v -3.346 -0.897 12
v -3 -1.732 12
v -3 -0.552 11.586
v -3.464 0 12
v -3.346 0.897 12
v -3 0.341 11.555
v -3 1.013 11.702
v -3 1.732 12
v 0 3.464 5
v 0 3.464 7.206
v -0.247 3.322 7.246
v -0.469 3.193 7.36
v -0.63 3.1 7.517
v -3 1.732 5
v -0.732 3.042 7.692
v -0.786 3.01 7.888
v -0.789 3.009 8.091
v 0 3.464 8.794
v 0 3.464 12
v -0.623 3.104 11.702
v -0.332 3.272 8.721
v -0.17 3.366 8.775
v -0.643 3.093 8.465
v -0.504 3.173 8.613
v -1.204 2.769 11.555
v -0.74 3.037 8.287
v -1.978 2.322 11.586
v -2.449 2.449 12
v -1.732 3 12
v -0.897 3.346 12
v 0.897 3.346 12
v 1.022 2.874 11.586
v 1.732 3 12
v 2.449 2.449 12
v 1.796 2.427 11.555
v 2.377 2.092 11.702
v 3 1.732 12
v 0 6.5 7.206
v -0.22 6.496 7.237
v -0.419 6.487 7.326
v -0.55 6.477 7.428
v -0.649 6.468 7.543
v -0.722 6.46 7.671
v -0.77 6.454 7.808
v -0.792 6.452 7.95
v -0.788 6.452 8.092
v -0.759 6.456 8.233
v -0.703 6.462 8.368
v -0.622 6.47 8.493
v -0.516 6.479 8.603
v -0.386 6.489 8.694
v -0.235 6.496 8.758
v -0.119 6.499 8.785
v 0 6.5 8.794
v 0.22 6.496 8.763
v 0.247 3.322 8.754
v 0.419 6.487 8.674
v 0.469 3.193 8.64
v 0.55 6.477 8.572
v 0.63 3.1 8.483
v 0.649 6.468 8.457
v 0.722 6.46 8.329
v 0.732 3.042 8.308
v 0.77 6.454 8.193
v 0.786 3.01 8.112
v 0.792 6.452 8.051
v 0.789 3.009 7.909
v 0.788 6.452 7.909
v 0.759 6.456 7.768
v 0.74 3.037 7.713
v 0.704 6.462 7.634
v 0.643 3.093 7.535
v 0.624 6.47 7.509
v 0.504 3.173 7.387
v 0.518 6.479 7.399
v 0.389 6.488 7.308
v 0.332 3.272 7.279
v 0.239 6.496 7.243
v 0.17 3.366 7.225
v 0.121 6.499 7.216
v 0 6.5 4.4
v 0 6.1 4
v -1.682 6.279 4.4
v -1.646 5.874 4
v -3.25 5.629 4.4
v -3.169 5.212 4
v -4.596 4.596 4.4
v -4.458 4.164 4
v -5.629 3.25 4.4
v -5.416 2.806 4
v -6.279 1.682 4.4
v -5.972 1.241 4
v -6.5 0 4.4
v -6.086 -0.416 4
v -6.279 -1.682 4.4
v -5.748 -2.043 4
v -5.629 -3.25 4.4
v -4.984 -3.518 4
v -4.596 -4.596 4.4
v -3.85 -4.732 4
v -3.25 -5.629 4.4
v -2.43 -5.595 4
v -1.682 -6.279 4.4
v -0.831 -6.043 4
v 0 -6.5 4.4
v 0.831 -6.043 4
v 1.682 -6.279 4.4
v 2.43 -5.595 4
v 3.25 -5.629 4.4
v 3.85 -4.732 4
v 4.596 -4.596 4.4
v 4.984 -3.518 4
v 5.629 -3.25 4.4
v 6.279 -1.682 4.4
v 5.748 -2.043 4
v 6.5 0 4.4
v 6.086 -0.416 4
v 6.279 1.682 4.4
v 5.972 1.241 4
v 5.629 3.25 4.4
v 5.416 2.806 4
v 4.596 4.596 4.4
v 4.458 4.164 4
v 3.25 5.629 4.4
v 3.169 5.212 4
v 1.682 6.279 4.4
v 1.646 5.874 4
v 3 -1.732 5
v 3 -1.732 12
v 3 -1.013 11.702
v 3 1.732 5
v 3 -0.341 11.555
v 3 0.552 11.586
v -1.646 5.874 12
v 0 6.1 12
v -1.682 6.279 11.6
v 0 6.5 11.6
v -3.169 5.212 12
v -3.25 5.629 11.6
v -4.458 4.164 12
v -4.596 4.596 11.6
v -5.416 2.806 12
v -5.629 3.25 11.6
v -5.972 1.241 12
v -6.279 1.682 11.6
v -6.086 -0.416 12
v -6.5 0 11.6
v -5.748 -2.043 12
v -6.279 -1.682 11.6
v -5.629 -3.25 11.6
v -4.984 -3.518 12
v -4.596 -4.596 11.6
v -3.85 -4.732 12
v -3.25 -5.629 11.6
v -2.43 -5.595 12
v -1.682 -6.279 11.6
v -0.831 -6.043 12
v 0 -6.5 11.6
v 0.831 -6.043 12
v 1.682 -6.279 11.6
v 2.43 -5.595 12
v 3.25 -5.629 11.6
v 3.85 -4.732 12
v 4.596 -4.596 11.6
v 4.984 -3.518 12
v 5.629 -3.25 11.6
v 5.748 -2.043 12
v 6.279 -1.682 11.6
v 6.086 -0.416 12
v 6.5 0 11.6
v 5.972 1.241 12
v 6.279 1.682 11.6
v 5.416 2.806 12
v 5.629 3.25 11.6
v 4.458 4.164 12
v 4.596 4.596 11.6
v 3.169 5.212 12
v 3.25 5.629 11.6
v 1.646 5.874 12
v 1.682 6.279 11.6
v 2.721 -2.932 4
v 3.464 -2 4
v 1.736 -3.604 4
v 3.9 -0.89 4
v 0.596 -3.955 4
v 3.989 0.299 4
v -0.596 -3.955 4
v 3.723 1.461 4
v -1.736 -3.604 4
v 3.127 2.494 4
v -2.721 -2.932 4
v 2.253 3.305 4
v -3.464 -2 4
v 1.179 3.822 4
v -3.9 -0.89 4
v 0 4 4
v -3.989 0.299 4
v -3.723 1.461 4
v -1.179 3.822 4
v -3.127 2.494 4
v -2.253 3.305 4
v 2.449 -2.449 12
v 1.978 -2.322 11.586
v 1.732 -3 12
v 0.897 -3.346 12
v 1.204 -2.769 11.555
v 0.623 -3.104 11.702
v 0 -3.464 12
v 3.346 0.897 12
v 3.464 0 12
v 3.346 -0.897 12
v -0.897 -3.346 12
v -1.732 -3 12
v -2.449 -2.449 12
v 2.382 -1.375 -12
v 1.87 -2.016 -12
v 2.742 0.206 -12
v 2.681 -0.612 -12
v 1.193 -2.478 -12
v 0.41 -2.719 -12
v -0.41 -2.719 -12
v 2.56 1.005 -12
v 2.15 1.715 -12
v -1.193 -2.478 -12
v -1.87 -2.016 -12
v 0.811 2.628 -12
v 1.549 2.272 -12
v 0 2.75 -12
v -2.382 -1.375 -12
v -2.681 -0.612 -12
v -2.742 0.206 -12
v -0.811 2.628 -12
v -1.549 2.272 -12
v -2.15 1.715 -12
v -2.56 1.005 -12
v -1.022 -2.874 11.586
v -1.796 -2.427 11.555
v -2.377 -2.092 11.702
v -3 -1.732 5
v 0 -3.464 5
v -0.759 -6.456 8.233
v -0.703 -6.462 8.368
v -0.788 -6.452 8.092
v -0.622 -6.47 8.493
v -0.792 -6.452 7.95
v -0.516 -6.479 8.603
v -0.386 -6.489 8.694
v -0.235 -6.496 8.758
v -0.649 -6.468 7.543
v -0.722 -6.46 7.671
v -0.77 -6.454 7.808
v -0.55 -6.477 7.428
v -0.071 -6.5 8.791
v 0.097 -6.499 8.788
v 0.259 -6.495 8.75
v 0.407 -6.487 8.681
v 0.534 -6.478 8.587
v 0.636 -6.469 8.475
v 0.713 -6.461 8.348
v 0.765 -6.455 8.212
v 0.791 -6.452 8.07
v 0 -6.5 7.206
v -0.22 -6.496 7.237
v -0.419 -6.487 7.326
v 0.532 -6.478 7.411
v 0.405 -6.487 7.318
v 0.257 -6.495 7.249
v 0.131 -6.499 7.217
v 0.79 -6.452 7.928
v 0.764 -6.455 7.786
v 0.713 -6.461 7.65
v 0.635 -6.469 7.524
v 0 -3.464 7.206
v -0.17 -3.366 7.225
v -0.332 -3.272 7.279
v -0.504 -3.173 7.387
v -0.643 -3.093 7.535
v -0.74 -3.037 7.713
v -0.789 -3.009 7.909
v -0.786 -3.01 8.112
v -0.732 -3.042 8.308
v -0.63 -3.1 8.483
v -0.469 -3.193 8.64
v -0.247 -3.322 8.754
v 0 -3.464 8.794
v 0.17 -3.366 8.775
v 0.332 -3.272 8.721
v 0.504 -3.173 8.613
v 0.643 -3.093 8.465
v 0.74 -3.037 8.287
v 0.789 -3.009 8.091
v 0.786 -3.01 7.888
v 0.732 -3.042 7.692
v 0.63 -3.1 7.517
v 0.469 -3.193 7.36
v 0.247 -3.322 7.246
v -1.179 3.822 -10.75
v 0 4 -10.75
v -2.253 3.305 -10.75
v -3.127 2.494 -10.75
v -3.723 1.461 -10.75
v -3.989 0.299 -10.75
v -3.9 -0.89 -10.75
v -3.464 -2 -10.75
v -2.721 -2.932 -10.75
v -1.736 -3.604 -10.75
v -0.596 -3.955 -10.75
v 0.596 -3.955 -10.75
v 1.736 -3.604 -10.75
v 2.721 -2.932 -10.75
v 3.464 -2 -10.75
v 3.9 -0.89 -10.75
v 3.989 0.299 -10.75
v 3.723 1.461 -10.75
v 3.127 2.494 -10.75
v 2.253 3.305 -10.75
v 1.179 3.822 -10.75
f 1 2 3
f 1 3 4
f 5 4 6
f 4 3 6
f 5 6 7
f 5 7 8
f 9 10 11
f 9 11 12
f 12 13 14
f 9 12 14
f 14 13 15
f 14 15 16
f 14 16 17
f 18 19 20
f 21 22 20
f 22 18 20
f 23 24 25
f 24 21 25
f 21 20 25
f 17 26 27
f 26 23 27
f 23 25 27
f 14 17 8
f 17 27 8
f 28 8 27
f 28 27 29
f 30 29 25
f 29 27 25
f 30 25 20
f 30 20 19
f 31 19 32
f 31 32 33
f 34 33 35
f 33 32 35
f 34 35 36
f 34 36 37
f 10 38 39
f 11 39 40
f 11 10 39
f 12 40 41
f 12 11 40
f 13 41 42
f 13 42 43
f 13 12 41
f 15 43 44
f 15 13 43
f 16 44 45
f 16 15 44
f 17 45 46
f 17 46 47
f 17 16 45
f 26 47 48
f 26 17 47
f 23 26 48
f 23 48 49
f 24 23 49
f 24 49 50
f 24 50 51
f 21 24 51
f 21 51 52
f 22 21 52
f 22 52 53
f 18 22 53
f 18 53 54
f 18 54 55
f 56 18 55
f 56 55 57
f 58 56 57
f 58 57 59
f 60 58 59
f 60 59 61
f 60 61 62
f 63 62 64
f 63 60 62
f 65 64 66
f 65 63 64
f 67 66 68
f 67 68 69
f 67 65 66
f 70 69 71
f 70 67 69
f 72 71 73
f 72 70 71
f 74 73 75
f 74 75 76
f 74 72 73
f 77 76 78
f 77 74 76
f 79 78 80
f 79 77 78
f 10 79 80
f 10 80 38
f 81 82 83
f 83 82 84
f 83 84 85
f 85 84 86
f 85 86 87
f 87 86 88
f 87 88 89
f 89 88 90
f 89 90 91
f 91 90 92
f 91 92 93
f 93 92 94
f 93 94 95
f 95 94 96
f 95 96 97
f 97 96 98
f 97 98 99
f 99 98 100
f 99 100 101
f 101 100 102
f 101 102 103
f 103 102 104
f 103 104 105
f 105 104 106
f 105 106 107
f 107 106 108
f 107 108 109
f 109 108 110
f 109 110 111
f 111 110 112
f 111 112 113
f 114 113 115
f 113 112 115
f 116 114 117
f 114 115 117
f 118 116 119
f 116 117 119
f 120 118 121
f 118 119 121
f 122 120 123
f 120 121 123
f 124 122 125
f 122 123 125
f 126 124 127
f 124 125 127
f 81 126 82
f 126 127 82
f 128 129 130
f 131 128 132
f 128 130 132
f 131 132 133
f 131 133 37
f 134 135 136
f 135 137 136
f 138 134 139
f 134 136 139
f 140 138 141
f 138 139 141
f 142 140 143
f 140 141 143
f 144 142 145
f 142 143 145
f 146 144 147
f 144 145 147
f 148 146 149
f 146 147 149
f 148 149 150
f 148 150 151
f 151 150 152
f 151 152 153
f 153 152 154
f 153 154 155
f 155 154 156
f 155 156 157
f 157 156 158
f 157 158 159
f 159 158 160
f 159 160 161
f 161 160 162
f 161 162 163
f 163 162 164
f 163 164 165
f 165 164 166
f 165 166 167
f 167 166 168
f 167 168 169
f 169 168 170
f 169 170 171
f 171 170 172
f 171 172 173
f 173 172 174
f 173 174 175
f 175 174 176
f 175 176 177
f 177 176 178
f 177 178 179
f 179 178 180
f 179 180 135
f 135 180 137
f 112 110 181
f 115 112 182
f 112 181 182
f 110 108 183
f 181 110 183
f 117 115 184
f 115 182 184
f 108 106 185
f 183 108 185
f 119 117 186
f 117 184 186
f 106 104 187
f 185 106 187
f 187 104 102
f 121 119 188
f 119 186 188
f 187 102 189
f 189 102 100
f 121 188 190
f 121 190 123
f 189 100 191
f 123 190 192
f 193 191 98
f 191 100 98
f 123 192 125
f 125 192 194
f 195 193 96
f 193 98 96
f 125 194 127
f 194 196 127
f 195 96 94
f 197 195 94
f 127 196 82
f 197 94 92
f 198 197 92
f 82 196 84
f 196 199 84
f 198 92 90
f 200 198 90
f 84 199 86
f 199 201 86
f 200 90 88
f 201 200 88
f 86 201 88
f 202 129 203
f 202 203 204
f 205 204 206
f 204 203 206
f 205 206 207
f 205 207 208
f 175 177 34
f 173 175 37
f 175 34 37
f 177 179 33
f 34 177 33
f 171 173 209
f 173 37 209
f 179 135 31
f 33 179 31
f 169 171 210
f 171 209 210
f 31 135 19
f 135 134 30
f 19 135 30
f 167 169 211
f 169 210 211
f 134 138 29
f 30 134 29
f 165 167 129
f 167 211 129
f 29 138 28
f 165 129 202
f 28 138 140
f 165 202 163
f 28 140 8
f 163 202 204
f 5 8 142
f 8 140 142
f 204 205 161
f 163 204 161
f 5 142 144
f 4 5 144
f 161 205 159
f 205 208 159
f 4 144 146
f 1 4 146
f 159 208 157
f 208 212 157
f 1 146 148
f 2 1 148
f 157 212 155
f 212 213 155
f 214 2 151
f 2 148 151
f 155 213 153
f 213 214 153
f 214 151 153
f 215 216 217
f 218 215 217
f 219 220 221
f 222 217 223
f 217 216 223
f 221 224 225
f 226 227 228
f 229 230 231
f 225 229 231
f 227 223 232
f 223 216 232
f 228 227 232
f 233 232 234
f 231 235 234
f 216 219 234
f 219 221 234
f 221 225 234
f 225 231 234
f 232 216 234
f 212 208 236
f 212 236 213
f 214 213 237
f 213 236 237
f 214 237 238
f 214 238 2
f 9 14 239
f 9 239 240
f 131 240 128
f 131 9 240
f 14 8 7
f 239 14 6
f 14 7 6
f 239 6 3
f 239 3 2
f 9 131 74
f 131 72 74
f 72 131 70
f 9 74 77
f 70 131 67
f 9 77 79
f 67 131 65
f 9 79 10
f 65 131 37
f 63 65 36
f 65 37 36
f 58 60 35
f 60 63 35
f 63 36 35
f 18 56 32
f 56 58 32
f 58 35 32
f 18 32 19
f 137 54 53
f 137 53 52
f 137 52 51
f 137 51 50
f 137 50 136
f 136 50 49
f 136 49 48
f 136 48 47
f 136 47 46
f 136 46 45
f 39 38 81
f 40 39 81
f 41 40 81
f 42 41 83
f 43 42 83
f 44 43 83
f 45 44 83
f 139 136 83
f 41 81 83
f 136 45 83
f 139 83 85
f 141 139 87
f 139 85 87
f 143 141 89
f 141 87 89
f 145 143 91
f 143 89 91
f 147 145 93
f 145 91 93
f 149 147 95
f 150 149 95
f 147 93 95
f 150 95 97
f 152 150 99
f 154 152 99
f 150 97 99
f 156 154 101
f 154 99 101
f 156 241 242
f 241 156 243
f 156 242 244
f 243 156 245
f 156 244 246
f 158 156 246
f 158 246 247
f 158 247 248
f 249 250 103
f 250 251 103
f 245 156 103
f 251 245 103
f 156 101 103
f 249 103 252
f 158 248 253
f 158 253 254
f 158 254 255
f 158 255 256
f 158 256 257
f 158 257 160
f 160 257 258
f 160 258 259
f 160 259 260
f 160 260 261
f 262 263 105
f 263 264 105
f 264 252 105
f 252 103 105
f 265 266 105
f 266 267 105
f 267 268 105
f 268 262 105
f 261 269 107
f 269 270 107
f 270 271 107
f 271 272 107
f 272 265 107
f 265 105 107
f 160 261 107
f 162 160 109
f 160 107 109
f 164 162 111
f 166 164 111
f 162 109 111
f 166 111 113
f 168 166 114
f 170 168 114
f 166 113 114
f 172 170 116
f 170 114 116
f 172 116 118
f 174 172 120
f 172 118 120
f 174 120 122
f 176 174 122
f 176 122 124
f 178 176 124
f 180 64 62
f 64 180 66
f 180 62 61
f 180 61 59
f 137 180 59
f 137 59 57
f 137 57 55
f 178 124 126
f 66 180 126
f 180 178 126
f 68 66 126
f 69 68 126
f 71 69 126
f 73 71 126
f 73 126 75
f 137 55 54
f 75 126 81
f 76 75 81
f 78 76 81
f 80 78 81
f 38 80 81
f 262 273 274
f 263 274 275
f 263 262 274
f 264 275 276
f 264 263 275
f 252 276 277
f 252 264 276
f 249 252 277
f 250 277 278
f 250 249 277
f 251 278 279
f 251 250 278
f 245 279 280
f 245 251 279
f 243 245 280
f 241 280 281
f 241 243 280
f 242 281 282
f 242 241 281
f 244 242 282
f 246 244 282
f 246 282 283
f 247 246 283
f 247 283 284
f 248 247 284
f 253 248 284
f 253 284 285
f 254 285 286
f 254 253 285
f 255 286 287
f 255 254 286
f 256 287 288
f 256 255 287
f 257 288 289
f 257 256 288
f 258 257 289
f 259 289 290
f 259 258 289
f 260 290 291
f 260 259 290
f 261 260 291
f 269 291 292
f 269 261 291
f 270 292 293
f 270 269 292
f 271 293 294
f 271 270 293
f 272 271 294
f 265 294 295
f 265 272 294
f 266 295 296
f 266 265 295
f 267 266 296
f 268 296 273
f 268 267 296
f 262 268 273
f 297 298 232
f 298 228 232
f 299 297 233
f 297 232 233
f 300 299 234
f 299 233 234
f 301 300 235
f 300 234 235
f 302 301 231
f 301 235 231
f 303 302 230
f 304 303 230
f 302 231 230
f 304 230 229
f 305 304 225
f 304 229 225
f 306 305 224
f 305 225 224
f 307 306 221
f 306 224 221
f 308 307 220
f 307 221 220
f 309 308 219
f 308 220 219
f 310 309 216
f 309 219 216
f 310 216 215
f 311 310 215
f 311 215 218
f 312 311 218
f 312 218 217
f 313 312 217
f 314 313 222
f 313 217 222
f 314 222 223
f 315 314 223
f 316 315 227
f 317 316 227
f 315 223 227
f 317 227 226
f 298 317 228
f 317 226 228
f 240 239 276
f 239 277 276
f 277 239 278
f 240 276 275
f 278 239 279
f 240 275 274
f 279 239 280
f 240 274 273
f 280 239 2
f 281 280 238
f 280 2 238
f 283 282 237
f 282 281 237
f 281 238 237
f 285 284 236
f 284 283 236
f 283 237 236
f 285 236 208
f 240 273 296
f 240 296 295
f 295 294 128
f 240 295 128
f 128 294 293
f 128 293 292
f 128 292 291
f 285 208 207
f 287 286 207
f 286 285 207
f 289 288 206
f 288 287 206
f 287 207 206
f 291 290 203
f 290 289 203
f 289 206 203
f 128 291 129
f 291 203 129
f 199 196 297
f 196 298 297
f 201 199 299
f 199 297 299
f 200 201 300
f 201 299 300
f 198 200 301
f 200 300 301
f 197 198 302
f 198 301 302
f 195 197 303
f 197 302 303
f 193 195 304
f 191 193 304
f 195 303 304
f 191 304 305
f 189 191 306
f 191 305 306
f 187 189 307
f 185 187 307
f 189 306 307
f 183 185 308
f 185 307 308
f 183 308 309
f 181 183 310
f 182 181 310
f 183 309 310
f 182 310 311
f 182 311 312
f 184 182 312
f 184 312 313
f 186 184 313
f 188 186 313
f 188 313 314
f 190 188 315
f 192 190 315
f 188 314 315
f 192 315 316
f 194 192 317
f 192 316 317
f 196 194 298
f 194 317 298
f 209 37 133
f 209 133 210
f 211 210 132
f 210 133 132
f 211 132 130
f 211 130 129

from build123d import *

# Parameters (mm, degrees)
CUT_EXTRUDE1_DEPTH      = 7
CUT_EXTRUDE3_DEPTH      = 7
CUT_EXTRUDE3_DEPTH_BACK = 7
SKETCH9_R               = 0.79375


with BuildPart() as part:
    # Sketch2 → Revolve1 (revolve)
    with BuildSketch(Plane(origin=(0, 0, 0), x_dir=(0, 0, -1), z_dir=(1, 0, 0))):
        Polygon((-12, 0), (-12, 6.1), (-11.6, 6.5), (-4.4, 6.5), (-4, 6.1), (-4, 4), (10.75, 4), (12, 2.75), (12, 0), align=None)
    revolve(axis=Axis((0, 0, -12), (0, 0, 1)))

    # Sketch3 → Cut-Extrude1 (cut)
    with BuildSketch(Plane.XY.offset(12)):
        Polygon((3, -1.732050808), (3, 1.732050808), (0, 3.464101615), (-3, 1.732050808), (-3, -1.732050808), (0, -3.464101615), align=None)
    extrude(amount=-CUT_EXTRUDE1_DEPTH, mode=Mode.SUBTRACT)

    # Cut-Extrude2 cone 1 section (through the dimple's axis) → Cut-Extrude2 (revolve, cut)
    with BuildSketch(Plane(origin=(0, 0, 12), x_dir=(0, -1, 0), z_dir=(1, 0, 0))):
        Polygon((0, 0), (3.464101615, 0), (0, 3.464101615), align=None)
    revolve(axis=Axis((0, 0, 12), (0, 0, -1)), mode=Mode.SUBTRACT)

    # Sketch9 → Cut-Extrude3 (cut, two sides: drawn at the far end of the back side and taken through both)
    with BuildSketch(Plane(origin=(0, 0, 0), x_dir=(1, 0, 0), z_dir=(0, 1, 0)).offset(-CUT_EXTRUDE3_DEPTH_BACK)):
        with Locations(Location((0, -8, 0), (0, 0, 90))):
            Circle(SKETCH9_R)
    extrude(amount=CUT_EXTRUDE3_DEPTH + CUT_EXTRUDE3_DEPTH_BACK, mode=Mode.SUBTRACT)


solid = part.part
